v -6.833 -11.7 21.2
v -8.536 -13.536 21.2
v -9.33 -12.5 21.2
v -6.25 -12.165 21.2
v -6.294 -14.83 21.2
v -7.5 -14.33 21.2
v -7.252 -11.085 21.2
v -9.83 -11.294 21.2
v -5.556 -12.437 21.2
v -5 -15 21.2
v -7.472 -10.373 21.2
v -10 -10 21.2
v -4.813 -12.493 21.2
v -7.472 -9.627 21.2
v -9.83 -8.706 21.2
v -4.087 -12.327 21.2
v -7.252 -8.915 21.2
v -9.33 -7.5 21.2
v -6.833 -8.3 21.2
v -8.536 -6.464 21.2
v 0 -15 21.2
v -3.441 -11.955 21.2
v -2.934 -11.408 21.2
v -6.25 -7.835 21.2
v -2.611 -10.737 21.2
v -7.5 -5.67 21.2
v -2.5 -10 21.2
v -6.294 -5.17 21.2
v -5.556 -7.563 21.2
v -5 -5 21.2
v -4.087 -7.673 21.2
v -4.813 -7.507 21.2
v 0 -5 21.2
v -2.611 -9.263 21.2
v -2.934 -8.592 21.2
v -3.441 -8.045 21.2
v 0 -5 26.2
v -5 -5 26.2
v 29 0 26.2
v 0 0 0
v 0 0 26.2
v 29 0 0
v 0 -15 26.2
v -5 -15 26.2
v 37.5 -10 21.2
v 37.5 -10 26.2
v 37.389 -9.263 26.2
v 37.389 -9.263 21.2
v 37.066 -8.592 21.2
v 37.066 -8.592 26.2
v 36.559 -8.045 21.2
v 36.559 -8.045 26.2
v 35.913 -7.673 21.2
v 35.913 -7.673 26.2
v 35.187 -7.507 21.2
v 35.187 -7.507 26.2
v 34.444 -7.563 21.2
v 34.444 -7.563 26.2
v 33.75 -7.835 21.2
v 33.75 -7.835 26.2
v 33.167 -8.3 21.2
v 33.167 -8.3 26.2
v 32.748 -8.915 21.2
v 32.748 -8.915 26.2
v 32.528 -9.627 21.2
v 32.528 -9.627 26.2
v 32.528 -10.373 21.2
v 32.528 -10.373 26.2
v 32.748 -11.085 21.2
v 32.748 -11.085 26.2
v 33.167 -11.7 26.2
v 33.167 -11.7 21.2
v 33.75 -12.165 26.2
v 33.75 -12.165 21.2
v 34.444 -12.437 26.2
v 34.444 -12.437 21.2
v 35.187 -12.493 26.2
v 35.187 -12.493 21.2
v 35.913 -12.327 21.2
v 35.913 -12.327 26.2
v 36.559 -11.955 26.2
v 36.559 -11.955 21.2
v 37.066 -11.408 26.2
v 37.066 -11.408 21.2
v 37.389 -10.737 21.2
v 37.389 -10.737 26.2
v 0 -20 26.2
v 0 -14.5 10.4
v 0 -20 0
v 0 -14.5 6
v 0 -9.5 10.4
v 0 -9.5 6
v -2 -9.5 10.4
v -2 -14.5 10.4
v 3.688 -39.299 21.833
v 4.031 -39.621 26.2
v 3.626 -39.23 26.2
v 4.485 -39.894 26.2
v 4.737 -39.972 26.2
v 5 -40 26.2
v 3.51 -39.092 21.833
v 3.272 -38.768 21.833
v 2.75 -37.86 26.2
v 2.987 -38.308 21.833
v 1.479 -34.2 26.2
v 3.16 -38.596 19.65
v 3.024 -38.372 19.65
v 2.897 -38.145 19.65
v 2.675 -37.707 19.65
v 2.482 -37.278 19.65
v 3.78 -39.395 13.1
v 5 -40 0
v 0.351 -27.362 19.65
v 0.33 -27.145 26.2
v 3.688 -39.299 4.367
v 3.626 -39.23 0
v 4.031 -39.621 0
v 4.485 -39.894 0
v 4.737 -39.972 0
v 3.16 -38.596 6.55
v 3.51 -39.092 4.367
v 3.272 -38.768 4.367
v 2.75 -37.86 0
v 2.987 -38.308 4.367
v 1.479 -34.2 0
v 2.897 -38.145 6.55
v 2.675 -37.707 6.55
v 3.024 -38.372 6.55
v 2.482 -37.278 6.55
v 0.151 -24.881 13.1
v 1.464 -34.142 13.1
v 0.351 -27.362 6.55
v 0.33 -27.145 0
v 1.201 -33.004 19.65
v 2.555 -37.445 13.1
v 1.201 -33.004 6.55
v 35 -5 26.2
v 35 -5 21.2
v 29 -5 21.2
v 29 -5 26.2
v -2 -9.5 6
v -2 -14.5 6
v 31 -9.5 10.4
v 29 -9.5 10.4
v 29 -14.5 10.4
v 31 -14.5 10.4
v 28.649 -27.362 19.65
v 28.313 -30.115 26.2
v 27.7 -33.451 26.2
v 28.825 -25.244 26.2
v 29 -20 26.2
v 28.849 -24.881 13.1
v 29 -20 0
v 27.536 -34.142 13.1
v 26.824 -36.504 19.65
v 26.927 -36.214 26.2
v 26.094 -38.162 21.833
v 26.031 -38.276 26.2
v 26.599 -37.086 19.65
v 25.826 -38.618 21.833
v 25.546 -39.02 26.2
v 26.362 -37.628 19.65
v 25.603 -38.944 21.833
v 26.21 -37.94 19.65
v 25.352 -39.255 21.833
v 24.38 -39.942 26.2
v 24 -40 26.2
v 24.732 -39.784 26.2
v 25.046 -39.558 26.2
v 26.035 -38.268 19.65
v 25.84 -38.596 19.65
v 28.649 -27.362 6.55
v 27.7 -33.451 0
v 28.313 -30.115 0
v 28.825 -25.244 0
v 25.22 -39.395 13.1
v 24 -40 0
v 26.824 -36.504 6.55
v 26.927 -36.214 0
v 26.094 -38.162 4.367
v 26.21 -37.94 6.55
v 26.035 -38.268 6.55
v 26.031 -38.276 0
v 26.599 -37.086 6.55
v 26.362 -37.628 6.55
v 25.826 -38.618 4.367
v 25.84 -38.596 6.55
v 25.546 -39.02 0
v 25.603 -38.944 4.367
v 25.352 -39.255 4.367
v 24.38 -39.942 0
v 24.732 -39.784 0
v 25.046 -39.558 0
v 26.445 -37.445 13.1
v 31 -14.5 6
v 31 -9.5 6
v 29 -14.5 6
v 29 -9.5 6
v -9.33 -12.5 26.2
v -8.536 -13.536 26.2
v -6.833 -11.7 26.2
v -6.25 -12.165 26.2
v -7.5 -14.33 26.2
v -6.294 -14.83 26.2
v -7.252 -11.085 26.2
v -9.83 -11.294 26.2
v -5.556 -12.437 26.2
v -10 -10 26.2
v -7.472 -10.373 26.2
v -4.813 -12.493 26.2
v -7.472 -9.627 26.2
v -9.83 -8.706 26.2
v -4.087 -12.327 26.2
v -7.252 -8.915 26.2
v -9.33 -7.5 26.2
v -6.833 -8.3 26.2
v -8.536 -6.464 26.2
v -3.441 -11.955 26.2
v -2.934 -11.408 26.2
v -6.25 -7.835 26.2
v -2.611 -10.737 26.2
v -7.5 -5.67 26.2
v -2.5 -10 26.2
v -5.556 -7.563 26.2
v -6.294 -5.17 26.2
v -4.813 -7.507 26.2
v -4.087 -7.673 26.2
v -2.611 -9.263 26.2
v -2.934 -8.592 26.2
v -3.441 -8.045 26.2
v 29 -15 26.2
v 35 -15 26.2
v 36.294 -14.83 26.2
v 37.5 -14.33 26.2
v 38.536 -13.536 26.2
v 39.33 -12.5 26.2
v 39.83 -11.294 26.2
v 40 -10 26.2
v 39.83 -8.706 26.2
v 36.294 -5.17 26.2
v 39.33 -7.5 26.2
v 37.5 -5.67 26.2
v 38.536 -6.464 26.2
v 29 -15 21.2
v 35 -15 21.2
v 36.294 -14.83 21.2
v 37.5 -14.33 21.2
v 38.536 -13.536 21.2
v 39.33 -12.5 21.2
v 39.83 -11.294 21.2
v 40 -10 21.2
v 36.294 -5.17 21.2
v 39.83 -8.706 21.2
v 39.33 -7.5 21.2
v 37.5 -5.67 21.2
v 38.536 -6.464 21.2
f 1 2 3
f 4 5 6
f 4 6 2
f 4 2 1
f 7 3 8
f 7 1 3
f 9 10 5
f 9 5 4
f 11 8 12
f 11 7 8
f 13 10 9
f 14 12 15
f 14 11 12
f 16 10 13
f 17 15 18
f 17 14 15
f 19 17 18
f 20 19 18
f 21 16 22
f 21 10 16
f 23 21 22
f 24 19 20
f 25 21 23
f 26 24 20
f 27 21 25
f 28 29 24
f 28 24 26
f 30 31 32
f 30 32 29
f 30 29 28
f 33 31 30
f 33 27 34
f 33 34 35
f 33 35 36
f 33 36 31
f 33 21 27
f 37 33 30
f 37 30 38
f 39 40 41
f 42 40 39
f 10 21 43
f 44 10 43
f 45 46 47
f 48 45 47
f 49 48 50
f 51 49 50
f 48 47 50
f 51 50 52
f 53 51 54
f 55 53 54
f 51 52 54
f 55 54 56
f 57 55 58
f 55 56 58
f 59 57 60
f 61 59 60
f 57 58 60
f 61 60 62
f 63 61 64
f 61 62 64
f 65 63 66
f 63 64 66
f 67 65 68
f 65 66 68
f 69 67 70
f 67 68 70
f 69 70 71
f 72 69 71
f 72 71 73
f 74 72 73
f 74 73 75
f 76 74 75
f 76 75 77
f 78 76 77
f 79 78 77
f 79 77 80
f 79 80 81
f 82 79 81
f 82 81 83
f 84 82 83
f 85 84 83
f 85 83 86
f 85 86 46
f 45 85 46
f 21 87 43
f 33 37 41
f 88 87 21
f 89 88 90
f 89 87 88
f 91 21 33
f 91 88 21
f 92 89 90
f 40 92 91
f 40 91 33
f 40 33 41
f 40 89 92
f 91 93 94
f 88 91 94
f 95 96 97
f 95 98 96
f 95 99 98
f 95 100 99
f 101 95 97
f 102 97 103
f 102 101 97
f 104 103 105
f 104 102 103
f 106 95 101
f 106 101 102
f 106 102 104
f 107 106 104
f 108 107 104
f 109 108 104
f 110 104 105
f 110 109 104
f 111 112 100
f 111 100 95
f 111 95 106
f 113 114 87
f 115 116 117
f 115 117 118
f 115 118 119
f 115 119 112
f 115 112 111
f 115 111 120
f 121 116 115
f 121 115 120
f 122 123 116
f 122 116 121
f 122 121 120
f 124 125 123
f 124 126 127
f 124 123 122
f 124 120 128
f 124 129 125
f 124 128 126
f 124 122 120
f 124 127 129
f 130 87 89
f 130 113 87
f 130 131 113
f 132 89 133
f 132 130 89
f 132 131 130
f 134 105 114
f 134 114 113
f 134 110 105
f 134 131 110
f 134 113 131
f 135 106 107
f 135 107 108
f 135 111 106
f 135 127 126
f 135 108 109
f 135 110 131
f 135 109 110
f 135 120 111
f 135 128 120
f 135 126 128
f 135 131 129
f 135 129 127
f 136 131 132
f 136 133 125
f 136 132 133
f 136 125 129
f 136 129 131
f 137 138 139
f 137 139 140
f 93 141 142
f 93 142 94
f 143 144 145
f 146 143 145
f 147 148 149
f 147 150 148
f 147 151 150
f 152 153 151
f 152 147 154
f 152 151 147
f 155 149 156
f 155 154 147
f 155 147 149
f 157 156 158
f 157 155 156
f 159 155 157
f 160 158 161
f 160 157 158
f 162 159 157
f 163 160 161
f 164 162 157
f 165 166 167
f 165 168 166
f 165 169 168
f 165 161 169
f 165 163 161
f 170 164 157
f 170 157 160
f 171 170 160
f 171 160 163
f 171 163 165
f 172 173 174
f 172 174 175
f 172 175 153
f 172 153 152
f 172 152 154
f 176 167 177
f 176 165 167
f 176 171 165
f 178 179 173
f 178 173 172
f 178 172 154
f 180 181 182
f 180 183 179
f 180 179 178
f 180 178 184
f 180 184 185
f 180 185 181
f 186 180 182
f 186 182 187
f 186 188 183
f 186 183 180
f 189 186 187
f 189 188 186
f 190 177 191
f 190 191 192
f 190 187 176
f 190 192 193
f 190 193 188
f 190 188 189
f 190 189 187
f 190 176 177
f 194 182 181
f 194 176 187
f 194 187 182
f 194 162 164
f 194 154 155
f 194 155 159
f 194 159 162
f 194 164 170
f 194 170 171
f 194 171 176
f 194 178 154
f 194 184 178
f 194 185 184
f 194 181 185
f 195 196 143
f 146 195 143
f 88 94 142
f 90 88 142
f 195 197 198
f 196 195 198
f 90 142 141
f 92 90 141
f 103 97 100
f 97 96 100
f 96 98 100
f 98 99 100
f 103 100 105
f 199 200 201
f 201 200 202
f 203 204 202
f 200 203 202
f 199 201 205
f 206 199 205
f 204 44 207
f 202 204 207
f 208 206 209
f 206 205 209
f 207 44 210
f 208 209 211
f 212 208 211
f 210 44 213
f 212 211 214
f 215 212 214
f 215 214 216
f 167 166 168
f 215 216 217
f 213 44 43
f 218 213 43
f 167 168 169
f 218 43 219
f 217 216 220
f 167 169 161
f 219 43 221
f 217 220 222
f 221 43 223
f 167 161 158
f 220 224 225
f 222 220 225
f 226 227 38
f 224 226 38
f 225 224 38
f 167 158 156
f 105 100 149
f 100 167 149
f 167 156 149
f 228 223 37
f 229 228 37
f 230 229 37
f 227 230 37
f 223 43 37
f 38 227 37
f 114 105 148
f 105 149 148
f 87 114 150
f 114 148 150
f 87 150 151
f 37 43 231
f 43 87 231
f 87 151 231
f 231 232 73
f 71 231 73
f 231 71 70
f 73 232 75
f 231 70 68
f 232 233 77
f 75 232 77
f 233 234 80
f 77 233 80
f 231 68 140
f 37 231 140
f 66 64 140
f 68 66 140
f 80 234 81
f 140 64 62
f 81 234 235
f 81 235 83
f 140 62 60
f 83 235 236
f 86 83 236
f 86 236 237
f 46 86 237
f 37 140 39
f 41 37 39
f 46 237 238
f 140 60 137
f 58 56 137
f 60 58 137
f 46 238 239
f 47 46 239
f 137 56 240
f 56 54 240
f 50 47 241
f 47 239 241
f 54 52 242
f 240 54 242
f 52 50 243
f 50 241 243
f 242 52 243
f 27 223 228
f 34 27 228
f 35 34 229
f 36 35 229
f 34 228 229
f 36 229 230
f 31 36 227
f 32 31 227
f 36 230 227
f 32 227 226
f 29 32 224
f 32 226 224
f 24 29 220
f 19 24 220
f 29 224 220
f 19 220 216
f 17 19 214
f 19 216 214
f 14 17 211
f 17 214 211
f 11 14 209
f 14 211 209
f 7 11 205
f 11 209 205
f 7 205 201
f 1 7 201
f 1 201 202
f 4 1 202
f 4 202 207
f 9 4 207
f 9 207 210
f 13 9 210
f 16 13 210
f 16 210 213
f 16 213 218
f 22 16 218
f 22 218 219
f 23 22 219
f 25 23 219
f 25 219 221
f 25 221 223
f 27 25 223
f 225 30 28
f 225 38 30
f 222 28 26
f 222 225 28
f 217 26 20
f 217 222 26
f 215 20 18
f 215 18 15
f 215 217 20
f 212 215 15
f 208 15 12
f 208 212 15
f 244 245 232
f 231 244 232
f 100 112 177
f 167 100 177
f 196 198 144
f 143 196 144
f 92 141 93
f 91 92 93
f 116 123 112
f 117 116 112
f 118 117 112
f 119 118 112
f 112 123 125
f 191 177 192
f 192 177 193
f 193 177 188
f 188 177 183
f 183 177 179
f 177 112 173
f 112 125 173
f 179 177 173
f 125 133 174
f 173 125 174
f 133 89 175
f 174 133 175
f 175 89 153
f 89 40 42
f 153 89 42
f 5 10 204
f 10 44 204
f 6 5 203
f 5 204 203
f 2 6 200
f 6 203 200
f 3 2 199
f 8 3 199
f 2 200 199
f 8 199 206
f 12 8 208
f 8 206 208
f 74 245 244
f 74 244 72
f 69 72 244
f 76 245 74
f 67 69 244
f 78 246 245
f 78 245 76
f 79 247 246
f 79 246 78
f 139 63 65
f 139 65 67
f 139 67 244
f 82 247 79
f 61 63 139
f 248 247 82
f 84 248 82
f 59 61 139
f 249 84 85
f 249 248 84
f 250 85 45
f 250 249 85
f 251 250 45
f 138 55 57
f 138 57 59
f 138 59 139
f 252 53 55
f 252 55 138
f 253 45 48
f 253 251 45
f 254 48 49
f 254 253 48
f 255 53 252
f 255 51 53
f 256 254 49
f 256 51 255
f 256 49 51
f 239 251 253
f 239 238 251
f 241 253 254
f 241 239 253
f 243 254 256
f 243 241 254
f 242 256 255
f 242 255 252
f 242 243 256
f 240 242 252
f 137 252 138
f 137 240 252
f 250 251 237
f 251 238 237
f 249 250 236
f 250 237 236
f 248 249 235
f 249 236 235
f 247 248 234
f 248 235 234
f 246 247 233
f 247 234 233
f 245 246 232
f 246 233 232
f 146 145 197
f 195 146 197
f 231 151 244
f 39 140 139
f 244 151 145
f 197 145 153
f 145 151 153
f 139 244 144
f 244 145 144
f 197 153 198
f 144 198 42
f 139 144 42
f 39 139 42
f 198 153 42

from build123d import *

# Parameters (mm, degrees)
SKETCH1_W                = 29
SKETCH1_H                = 40
BOSS_EXTRUDE1_DEPTH      = 26.2
FILLET1_SIZE             = 20
FILLET1_SIZE_2           = 5
BOSS_EXTRUDE2_DEPTH      = 10
BOSS_EXTRUDE2_DEPTH_BACK = 40
SKETCH5_W                = 5
SKETCH5_H                = 10
FILLET2_R                = 5
SKETCH6_R                = 2.5
CUT_EXTRUDE2_DEPTH       = 6
BOSS_EXTRUDE3_DEPTH      = 2
BOSS_EXTRUDE3_DEPTH_BACK = 31


# Some blends are built 0.0001 mm under size
with BuildPart() as part:
    # Sketch1 → Boss-Extrude1 (new body)
    with BuildSketch(Plane.XY):
        with Locations((14.5, -20)):
            Rectangle(SKETCH1_W, SKETCH1_H)
    extrude(amount=BOSS_EXTRUDE1_DEPTH)

    # Fillet1
    # an asymmetric fillet: 20, 5 mm, written as the material it takes off along each edge
    with BuildSketch(Plane(origin=(29, -40, -50), x_dir=(0, 1, 0), z_dir=(0, 0, 1))) as fillet1_piece_1:
        with BuildLine():
            Bezier((FILLET1_SIZE, 0), (0, 0), (0, FILLET1_SIZE_2), weights=[1, 0.707106781, 1])
            Line((0, FILLET1_SIZE_2), (0, 0))
            Line((0, 0), (FILLET1_SIZE, 0))
        make_face()
    extrude(amount=126.2, mode=Mode.SUBTRACT)
    with BuildSketch(Plane(origin=(0, -40, -50), x_dir=(1, 0, 0), z_dir=(0, 0, 1))) as fillet1_piece_2:
        with BuildLine():
            Bezier((FILLET1_SIZE_2, 0), (0, 0), (0, FILLET1_SIZE), weights=[1, 0.707106781, 1])
            Line((0, FILLET1_SIZE), (0, 0))
            Line((0, 0), (FILLET1_SIZE_2, 0))
        make_face()
    extrude(amount=126.2, mode=Mode.SUBTRACT)

    # Sketch5 → Boss-Extrude2 (add, two sides: drawn at the far end of the back side and taken through both)
    with BuildSketch(Plane.ZY.offset(-BOSS_EXTRUDE2_DEPTH_BACK)):
        with Locations((23.7, -10)):
            Rectangle(SKETCH5_W, SKETCH5_H)
    extrude(amount=BOSS_EXTRUDE2_DEPTH + BOSS_EXTRUDE2_DEPTH_BACK)

    # Fillet2
    fillet2_edges = [part.edges().sort_by_distance(p)[0] for p in [
        (40, -15, 23.7),
        (40, -5, 23.7),
        (-10, -15, 23.7),
        (-10, -5, 23.7),
    ]]
    fillet(fillet2_edges, radius=FILLET2_R - 0.0001)  # a hair under: the kernel refuses the full size

    # Sketch6 → Cut-Extrude2 (cut)
    with BuildSketch(Plane.XY.offset(26.2)):
        with Locations((-5, -10)):
            Circle(SKETCH6_R)
        with Locations((35, -10)):
            Circle(SKETCH6_R)
    extrude(amount=-CUT_EXTRUDE2_DEPTH, mode=Mode.SUBTRACT)

    # Sketch7 → Boss-Extrude3 (add, two sides: drawn at the far end of the back side and taken through both)
    with BuildSketch(Plane(origin=(29, 0, 0), x_dir=(0, 0, -1), z_dir=(1, 0, 0)).offset(-BOSS_EXTRUDE3_DEPTH_BACK)):
        Polygon((-8.2, -9.5), (-6, -9.5), (-6, -12), (-6, -14.5), (-8.2, -14.5), (-10.4, -14.5), (-10.4, -12), (-10.4, -9.5), align=None)
    extrude(amount=BOSS_EXTRUDE3_DEPTH + BOSS_EXTRUDE3_DEPTH_BACK)


solid = part.part
